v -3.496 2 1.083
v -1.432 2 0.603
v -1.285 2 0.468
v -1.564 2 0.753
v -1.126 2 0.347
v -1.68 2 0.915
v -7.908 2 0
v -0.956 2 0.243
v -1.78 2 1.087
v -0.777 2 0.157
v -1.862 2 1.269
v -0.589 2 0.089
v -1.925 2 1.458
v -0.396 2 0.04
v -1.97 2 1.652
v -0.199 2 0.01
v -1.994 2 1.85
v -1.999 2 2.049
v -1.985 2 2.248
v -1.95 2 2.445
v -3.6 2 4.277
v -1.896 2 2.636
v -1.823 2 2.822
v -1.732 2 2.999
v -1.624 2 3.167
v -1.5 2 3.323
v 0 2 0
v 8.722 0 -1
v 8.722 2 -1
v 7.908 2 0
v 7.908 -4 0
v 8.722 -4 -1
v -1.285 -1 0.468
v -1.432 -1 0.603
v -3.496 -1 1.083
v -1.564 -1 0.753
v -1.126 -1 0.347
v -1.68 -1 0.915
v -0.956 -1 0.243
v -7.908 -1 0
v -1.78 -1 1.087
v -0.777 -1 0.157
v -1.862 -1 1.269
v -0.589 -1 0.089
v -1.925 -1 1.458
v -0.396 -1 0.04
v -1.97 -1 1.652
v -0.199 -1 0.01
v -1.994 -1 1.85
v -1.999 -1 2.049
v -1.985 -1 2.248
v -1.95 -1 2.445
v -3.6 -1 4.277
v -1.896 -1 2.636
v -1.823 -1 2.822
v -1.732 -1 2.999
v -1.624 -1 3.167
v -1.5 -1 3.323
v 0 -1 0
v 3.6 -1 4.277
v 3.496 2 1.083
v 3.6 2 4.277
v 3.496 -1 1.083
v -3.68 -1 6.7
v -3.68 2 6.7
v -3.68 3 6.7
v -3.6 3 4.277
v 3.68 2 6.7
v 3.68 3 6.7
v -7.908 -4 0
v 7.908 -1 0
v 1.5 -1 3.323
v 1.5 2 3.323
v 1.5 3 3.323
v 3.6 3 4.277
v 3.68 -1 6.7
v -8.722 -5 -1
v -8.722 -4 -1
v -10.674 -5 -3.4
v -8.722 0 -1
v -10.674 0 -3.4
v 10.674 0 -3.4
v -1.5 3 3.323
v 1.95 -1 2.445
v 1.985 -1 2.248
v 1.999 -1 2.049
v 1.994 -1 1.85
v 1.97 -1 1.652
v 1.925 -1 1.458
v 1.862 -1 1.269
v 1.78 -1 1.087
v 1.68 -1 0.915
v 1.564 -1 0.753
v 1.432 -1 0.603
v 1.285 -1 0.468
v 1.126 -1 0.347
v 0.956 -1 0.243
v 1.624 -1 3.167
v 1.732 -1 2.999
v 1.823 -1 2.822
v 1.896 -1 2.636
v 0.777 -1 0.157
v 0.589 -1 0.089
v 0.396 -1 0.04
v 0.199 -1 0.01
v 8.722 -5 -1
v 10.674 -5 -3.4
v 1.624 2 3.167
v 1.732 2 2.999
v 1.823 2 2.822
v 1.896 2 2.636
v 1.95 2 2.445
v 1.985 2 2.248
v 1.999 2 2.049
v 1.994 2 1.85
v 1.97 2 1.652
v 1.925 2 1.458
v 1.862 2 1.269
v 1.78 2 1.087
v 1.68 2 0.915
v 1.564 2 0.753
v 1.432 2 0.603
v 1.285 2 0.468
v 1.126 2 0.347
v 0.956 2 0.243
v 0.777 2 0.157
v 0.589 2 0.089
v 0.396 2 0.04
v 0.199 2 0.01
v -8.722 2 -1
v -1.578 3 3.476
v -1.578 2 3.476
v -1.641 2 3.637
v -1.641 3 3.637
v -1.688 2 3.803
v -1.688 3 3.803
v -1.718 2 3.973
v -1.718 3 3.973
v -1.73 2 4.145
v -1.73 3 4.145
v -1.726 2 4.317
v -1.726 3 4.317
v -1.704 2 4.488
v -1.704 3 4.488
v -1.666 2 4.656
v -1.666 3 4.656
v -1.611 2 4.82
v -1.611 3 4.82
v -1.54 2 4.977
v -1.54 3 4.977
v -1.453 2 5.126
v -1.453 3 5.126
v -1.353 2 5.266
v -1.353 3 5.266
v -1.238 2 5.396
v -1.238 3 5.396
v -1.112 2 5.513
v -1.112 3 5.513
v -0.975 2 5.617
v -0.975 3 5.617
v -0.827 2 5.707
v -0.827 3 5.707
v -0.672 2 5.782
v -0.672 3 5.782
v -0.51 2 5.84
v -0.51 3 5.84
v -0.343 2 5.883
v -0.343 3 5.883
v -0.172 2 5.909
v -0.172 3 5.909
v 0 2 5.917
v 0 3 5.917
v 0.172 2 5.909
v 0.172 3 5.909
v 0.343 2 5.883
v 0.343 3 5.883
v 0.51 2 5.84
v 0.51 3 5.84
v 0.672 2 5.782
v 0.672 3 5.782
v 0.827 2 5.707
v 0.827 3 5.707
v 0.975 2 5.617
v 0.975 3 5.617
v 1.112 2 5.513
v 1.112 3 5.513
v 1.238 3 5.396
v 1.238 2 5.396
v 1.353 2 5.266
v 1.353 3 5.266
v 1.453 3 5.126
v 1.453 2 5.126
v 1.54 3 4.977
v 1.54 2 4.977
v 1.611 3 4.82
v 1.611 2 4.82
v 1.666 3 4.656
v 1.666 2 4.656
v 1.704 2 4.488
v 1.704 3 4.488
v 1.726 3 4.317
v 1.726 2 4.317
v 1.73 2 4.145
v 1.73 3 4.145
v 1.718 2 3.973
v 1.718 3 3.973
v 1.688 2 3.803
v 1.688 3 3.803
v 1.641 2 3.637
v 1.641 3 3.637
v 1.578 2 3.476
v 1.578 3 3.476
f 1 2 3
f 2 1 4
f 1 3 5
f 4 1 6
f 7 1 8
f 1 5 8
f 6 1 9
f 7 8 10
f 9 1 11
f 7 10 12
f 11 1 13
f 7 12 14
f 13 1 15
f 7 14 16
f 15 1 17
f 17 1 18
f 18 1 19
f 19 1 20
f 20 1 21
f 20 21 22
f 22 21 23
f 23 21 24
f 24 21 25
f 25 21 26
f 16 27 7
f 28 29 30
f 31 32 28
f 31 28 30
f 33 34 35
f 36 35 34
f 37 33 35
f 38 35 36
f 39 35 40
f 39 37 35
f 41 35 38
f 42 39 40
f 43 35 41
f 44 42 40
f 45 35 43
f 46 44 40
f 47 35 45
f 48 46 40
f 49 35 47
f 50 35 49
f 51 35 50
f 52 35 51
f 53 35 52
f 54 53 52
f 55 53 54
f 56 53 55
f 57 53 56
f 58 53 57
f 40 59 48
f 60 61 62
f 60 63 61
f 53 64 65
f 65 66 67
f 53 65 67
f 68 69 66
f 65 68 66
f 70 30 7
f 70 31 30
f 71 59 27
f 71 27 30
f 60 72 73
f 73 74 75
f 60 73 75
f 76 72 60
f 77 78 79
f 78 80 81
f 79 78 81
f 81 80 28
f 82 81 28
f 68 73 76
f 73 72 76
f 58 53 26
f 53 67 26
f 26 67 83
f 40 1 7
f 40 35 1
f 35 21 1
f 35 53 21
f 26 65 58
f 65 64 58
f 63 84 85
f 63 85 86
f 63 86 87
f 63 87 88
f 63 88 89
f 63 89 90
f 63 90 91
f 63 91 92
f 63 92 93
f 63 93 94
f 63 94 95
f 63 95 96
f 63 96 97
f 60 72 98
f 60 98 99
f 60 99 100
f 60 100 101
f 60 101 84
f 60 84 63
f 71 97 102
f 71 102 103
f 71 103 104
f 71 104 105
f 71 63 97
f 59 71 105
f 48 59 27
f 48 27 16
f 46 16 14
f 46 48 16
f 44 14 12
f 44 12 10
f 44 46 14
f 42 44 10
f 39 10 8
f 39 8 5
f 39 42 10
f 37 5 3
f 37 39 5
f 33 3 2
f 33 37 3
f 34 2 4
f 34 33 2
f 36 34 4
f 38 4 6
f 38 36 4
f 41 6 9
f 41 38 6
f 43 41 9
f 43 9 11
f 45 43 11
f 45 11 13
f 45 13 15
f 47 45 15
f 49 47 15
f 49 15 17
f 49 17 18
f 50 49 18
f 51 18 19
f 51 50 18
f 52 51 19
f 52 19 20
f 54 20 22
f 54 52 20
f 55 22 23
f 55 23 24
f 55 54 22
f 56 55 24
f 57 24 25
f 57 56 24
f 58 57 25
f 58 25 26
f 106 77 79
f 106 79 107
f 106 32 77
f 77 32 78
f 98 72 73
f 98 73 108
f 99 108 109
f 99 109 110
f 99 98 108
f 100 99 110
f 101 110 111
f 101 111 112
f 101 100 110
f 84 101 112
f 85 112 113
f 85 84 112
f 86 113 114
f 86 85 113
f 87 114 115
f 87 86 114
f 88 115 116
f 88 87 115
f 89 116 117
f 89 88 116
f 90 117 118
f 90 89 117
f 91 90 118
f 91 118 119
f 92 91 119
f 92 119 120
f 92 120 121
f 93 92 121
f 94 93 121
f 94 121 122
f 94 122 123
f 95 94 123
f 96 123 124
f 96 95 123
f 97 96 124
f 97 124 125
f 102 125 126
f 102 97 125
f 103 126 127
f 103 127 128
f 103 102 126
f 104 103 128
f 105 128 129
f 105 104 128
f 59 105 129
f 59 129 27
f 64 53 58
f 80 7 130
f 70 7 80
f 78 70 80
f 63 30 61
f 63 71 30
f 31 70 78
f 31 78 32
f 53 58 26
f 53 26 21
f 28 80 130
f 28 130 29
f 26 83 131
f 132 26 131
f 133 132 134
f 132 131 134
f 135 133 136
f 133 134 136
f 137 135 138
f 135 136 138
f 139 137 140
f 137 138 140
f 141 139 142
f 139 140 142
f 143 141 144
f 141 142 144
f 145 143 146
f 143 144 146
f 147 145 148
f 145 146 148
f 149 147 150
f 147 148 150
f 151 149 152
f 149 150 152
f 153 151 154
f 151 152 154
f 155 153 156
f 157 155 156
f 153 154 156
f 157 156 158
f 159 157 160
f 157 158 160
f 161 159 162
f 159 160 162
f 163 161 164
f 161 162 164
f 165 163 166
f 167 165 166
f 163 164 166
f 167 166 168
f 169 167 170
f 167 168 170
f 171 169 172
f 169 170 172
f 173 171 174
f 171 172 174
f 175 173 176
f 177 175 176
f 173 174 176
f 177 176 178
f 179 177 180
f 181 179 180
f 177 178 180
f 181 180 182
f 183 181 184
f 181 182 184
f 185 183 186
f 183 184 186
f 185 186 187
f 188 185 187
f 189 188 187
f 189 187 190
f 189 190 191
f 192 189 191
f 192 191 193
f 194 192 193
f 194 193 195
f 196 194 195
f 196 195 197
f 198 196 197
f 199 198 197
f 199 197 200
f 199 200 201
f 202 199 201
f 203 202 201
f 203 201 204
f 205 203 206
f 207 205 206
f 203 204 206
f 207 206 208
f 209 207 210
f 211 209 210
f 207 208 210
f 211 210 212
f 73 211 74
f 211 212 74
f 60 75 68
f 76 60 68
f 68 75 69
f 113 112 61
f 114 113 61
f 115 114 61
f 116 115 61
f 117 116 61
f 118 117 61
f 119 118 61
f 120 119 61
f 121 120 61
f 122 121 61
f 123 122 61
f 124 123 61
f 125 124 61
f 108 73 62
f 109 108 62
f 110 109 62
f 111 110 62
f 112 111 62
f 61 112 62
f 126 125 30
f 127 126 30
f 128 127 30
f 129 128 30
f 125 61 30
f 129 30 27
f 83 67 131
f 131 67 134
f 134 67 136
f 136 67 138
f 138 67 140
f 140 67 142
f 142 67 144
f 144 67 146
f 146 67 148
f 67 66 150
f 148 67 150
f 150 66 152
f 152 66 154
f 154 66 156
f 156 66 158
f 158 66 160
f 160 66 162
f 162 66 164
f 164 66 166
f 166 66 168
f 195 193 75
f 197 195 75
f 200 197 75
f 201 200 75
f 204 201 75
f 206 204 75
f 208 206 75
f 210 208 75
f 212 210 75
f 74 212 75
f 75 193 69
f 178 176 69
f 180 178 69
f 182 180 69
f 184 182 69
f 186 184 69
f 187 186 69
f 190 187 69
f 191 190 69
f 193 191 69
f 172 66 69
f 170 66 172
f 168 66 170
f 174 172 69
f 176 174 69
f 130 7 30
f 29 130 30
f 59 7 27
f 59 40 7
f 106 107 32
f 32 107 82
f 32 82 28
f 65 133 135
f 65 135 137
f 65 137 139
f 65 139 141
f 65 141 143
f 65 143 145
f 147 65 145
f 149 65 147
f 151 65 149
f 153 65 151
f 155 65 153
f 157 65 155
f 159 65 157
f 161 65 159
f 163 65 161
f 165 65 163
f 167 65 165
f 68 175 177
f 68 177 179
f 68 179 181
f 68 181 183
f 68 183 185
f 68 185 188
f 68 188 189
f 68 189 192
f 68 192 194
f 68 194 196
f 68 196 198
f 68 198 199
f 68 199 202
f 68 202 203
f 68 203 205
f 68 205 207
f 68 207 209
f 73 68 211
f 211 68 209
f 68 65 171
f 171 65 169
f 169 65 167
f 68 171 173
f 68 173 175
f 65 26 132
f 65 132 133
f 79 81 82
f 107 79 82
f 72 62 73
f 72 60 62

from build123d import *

# Parameters (mm, degrees)
F1_DEPTH      = 4
F1_DEPTH_BACK = 2
F2_DEPTH      = 3
F2_DEPTH_BACK = 1
F3_DEPTH      = 5
F4_DEPTH      = 1
F4_DEPTH_BACK = 2
F5_DEPTH      = 2
F5_DEPTH_BACK = 2


with BuildPart() as f1:
    # F0 (on Front) → F1 (new body, two sides)
    with BuildSketch(Plane.XZ) as f1_sk:
        Polygon((7.9080856242, 0), (0, 0), (-7.9080856242, 0), (-8.721566759, -1), (8.721566759, -1), align=None)
    extrude(amount=F1_DEPTH)
    extrude(f1_sk.sketch, amount=-F1_DEPTH_BACK)

    # F0 (on Front) → F3 (join)
    with BuildSketch(Plane.XZ):
        Polygon((8.721566759, -1), (-8.721566759, -1), (-10.6739214827, -3.4), (0, -3.4), (10.6739214827, -3.4), align=None)
    extrude(amount=F3_DEPTH)


with BuildPart() as f2:
    # F0 (on Front) → F2 (new body, two sides)
    with BuildSketch(Plane.XZ) as f2_sk:
        Polygon((3.6002836309, 4.277432868), (3.6796294153, 6.7), (1.5, 3.3228756555), align=None)
        Polygon((-3.6002836309, 4.277432868), (-1.5, 3.3228756555), (-3.6796294153, 6.7), align=None)
        with BuildLine():
            Line((1.5, 3.3228756555), (3.6796294153, 6.7))
            Line((3.6796294153, 6.7), (0, 6.7))
            Line((0, 6.7), (-3.6796294153, 6.7))
            Line((-3.6796294153, 6.7), (-1.5, 3.3228756555))
            ThreePointArc((-1.5, 3.3228756555), (0, 5.9172543008), (1.5, 3.3228756555))
        make_face()
    extrude(amount=-F2_DEPTH)
    extrude(f2_sk.sketch, amount=F2_DEPTH_BACK)

    # F0 (on Front) → F5 (cut, two sides)
    with BuildSketch(Plane.XZ) as f5_sk:
        with BuildLine():
            Line((1.5, 3.3228756555), (3.6796294153, 6.7))
            Line((3.6796294153, 6.7), (0, 6.7))
            Line((0, 6.7), (-3.6796294153, 6.7))
            Line((-3.6796294153, 6.7), (-1.5, 3.3228756555))
            ThreePointArc((-1.5, 3.3228756555), (0, 5.9172543008), (1.5, 3.3228756555))
        make_face()
    extrude(amount=-F5_DEPTH, mode=Mode.SUBTRACT)
    extrude(f5_sk.sketch, amount=F5_DEPTH_BACK, mode=Mode.SUBTRACT)


with BuildPart() as f4:
    # F0 (on Front) → F4 (new body, two sides)
    with BuildSketch(Plane.XZ) as f4_sk:
        with BuildLine():
            Line((-7.9080856242, 0), (0, 0))
            ThreePointArc((0, 0), (-1.8228756555, 1.1771243445), (-1.5, 3.3228756555))
            Line((-1.5, 3.3228756555), (-3.6002836309, 4.277432868))
            Line((-3.6002836309, 4.277432868), (-3.4956480376, 1.0827231454))
            Line((-3.4956480376, 1.0827231454), (-7.9080856242, 0))
        make_face()
    extrude(amount=F4_DEPTH)
    extrude(f4_sk.sketch, amount=-F4_DEPTH_BACK)


with BuildPart() as f4b:
    # F0 (on Front) → F4, piece 2 (new body, two sides)
    with BuildSketch(Plane.XZ) as f4_2_sk:
        with BuildLine():
            Line((3.6002836309, 4.277432868), (1.5, 3.3228756555))
            ThreePointArc((1.5, 3.3228756555), (1.8228756555, 1.1771243445), (0, 0))
            Line((0, 0), (7.9080856242, 0))
            Line((7.9080856242, 0), (3.4956480376, 1.0827231454))
            Line((3.4956480376, 1.0827231454), (3.6002836309, 4.277432868))
        make_face()
    extrude(amount=F4_DEPTH)
    extrude(f4_2_sk.sketch, amount=-F4_DEPTH_BACK)


solid = Compound([f1.part, f2.part, f4.part, f4b.part])
